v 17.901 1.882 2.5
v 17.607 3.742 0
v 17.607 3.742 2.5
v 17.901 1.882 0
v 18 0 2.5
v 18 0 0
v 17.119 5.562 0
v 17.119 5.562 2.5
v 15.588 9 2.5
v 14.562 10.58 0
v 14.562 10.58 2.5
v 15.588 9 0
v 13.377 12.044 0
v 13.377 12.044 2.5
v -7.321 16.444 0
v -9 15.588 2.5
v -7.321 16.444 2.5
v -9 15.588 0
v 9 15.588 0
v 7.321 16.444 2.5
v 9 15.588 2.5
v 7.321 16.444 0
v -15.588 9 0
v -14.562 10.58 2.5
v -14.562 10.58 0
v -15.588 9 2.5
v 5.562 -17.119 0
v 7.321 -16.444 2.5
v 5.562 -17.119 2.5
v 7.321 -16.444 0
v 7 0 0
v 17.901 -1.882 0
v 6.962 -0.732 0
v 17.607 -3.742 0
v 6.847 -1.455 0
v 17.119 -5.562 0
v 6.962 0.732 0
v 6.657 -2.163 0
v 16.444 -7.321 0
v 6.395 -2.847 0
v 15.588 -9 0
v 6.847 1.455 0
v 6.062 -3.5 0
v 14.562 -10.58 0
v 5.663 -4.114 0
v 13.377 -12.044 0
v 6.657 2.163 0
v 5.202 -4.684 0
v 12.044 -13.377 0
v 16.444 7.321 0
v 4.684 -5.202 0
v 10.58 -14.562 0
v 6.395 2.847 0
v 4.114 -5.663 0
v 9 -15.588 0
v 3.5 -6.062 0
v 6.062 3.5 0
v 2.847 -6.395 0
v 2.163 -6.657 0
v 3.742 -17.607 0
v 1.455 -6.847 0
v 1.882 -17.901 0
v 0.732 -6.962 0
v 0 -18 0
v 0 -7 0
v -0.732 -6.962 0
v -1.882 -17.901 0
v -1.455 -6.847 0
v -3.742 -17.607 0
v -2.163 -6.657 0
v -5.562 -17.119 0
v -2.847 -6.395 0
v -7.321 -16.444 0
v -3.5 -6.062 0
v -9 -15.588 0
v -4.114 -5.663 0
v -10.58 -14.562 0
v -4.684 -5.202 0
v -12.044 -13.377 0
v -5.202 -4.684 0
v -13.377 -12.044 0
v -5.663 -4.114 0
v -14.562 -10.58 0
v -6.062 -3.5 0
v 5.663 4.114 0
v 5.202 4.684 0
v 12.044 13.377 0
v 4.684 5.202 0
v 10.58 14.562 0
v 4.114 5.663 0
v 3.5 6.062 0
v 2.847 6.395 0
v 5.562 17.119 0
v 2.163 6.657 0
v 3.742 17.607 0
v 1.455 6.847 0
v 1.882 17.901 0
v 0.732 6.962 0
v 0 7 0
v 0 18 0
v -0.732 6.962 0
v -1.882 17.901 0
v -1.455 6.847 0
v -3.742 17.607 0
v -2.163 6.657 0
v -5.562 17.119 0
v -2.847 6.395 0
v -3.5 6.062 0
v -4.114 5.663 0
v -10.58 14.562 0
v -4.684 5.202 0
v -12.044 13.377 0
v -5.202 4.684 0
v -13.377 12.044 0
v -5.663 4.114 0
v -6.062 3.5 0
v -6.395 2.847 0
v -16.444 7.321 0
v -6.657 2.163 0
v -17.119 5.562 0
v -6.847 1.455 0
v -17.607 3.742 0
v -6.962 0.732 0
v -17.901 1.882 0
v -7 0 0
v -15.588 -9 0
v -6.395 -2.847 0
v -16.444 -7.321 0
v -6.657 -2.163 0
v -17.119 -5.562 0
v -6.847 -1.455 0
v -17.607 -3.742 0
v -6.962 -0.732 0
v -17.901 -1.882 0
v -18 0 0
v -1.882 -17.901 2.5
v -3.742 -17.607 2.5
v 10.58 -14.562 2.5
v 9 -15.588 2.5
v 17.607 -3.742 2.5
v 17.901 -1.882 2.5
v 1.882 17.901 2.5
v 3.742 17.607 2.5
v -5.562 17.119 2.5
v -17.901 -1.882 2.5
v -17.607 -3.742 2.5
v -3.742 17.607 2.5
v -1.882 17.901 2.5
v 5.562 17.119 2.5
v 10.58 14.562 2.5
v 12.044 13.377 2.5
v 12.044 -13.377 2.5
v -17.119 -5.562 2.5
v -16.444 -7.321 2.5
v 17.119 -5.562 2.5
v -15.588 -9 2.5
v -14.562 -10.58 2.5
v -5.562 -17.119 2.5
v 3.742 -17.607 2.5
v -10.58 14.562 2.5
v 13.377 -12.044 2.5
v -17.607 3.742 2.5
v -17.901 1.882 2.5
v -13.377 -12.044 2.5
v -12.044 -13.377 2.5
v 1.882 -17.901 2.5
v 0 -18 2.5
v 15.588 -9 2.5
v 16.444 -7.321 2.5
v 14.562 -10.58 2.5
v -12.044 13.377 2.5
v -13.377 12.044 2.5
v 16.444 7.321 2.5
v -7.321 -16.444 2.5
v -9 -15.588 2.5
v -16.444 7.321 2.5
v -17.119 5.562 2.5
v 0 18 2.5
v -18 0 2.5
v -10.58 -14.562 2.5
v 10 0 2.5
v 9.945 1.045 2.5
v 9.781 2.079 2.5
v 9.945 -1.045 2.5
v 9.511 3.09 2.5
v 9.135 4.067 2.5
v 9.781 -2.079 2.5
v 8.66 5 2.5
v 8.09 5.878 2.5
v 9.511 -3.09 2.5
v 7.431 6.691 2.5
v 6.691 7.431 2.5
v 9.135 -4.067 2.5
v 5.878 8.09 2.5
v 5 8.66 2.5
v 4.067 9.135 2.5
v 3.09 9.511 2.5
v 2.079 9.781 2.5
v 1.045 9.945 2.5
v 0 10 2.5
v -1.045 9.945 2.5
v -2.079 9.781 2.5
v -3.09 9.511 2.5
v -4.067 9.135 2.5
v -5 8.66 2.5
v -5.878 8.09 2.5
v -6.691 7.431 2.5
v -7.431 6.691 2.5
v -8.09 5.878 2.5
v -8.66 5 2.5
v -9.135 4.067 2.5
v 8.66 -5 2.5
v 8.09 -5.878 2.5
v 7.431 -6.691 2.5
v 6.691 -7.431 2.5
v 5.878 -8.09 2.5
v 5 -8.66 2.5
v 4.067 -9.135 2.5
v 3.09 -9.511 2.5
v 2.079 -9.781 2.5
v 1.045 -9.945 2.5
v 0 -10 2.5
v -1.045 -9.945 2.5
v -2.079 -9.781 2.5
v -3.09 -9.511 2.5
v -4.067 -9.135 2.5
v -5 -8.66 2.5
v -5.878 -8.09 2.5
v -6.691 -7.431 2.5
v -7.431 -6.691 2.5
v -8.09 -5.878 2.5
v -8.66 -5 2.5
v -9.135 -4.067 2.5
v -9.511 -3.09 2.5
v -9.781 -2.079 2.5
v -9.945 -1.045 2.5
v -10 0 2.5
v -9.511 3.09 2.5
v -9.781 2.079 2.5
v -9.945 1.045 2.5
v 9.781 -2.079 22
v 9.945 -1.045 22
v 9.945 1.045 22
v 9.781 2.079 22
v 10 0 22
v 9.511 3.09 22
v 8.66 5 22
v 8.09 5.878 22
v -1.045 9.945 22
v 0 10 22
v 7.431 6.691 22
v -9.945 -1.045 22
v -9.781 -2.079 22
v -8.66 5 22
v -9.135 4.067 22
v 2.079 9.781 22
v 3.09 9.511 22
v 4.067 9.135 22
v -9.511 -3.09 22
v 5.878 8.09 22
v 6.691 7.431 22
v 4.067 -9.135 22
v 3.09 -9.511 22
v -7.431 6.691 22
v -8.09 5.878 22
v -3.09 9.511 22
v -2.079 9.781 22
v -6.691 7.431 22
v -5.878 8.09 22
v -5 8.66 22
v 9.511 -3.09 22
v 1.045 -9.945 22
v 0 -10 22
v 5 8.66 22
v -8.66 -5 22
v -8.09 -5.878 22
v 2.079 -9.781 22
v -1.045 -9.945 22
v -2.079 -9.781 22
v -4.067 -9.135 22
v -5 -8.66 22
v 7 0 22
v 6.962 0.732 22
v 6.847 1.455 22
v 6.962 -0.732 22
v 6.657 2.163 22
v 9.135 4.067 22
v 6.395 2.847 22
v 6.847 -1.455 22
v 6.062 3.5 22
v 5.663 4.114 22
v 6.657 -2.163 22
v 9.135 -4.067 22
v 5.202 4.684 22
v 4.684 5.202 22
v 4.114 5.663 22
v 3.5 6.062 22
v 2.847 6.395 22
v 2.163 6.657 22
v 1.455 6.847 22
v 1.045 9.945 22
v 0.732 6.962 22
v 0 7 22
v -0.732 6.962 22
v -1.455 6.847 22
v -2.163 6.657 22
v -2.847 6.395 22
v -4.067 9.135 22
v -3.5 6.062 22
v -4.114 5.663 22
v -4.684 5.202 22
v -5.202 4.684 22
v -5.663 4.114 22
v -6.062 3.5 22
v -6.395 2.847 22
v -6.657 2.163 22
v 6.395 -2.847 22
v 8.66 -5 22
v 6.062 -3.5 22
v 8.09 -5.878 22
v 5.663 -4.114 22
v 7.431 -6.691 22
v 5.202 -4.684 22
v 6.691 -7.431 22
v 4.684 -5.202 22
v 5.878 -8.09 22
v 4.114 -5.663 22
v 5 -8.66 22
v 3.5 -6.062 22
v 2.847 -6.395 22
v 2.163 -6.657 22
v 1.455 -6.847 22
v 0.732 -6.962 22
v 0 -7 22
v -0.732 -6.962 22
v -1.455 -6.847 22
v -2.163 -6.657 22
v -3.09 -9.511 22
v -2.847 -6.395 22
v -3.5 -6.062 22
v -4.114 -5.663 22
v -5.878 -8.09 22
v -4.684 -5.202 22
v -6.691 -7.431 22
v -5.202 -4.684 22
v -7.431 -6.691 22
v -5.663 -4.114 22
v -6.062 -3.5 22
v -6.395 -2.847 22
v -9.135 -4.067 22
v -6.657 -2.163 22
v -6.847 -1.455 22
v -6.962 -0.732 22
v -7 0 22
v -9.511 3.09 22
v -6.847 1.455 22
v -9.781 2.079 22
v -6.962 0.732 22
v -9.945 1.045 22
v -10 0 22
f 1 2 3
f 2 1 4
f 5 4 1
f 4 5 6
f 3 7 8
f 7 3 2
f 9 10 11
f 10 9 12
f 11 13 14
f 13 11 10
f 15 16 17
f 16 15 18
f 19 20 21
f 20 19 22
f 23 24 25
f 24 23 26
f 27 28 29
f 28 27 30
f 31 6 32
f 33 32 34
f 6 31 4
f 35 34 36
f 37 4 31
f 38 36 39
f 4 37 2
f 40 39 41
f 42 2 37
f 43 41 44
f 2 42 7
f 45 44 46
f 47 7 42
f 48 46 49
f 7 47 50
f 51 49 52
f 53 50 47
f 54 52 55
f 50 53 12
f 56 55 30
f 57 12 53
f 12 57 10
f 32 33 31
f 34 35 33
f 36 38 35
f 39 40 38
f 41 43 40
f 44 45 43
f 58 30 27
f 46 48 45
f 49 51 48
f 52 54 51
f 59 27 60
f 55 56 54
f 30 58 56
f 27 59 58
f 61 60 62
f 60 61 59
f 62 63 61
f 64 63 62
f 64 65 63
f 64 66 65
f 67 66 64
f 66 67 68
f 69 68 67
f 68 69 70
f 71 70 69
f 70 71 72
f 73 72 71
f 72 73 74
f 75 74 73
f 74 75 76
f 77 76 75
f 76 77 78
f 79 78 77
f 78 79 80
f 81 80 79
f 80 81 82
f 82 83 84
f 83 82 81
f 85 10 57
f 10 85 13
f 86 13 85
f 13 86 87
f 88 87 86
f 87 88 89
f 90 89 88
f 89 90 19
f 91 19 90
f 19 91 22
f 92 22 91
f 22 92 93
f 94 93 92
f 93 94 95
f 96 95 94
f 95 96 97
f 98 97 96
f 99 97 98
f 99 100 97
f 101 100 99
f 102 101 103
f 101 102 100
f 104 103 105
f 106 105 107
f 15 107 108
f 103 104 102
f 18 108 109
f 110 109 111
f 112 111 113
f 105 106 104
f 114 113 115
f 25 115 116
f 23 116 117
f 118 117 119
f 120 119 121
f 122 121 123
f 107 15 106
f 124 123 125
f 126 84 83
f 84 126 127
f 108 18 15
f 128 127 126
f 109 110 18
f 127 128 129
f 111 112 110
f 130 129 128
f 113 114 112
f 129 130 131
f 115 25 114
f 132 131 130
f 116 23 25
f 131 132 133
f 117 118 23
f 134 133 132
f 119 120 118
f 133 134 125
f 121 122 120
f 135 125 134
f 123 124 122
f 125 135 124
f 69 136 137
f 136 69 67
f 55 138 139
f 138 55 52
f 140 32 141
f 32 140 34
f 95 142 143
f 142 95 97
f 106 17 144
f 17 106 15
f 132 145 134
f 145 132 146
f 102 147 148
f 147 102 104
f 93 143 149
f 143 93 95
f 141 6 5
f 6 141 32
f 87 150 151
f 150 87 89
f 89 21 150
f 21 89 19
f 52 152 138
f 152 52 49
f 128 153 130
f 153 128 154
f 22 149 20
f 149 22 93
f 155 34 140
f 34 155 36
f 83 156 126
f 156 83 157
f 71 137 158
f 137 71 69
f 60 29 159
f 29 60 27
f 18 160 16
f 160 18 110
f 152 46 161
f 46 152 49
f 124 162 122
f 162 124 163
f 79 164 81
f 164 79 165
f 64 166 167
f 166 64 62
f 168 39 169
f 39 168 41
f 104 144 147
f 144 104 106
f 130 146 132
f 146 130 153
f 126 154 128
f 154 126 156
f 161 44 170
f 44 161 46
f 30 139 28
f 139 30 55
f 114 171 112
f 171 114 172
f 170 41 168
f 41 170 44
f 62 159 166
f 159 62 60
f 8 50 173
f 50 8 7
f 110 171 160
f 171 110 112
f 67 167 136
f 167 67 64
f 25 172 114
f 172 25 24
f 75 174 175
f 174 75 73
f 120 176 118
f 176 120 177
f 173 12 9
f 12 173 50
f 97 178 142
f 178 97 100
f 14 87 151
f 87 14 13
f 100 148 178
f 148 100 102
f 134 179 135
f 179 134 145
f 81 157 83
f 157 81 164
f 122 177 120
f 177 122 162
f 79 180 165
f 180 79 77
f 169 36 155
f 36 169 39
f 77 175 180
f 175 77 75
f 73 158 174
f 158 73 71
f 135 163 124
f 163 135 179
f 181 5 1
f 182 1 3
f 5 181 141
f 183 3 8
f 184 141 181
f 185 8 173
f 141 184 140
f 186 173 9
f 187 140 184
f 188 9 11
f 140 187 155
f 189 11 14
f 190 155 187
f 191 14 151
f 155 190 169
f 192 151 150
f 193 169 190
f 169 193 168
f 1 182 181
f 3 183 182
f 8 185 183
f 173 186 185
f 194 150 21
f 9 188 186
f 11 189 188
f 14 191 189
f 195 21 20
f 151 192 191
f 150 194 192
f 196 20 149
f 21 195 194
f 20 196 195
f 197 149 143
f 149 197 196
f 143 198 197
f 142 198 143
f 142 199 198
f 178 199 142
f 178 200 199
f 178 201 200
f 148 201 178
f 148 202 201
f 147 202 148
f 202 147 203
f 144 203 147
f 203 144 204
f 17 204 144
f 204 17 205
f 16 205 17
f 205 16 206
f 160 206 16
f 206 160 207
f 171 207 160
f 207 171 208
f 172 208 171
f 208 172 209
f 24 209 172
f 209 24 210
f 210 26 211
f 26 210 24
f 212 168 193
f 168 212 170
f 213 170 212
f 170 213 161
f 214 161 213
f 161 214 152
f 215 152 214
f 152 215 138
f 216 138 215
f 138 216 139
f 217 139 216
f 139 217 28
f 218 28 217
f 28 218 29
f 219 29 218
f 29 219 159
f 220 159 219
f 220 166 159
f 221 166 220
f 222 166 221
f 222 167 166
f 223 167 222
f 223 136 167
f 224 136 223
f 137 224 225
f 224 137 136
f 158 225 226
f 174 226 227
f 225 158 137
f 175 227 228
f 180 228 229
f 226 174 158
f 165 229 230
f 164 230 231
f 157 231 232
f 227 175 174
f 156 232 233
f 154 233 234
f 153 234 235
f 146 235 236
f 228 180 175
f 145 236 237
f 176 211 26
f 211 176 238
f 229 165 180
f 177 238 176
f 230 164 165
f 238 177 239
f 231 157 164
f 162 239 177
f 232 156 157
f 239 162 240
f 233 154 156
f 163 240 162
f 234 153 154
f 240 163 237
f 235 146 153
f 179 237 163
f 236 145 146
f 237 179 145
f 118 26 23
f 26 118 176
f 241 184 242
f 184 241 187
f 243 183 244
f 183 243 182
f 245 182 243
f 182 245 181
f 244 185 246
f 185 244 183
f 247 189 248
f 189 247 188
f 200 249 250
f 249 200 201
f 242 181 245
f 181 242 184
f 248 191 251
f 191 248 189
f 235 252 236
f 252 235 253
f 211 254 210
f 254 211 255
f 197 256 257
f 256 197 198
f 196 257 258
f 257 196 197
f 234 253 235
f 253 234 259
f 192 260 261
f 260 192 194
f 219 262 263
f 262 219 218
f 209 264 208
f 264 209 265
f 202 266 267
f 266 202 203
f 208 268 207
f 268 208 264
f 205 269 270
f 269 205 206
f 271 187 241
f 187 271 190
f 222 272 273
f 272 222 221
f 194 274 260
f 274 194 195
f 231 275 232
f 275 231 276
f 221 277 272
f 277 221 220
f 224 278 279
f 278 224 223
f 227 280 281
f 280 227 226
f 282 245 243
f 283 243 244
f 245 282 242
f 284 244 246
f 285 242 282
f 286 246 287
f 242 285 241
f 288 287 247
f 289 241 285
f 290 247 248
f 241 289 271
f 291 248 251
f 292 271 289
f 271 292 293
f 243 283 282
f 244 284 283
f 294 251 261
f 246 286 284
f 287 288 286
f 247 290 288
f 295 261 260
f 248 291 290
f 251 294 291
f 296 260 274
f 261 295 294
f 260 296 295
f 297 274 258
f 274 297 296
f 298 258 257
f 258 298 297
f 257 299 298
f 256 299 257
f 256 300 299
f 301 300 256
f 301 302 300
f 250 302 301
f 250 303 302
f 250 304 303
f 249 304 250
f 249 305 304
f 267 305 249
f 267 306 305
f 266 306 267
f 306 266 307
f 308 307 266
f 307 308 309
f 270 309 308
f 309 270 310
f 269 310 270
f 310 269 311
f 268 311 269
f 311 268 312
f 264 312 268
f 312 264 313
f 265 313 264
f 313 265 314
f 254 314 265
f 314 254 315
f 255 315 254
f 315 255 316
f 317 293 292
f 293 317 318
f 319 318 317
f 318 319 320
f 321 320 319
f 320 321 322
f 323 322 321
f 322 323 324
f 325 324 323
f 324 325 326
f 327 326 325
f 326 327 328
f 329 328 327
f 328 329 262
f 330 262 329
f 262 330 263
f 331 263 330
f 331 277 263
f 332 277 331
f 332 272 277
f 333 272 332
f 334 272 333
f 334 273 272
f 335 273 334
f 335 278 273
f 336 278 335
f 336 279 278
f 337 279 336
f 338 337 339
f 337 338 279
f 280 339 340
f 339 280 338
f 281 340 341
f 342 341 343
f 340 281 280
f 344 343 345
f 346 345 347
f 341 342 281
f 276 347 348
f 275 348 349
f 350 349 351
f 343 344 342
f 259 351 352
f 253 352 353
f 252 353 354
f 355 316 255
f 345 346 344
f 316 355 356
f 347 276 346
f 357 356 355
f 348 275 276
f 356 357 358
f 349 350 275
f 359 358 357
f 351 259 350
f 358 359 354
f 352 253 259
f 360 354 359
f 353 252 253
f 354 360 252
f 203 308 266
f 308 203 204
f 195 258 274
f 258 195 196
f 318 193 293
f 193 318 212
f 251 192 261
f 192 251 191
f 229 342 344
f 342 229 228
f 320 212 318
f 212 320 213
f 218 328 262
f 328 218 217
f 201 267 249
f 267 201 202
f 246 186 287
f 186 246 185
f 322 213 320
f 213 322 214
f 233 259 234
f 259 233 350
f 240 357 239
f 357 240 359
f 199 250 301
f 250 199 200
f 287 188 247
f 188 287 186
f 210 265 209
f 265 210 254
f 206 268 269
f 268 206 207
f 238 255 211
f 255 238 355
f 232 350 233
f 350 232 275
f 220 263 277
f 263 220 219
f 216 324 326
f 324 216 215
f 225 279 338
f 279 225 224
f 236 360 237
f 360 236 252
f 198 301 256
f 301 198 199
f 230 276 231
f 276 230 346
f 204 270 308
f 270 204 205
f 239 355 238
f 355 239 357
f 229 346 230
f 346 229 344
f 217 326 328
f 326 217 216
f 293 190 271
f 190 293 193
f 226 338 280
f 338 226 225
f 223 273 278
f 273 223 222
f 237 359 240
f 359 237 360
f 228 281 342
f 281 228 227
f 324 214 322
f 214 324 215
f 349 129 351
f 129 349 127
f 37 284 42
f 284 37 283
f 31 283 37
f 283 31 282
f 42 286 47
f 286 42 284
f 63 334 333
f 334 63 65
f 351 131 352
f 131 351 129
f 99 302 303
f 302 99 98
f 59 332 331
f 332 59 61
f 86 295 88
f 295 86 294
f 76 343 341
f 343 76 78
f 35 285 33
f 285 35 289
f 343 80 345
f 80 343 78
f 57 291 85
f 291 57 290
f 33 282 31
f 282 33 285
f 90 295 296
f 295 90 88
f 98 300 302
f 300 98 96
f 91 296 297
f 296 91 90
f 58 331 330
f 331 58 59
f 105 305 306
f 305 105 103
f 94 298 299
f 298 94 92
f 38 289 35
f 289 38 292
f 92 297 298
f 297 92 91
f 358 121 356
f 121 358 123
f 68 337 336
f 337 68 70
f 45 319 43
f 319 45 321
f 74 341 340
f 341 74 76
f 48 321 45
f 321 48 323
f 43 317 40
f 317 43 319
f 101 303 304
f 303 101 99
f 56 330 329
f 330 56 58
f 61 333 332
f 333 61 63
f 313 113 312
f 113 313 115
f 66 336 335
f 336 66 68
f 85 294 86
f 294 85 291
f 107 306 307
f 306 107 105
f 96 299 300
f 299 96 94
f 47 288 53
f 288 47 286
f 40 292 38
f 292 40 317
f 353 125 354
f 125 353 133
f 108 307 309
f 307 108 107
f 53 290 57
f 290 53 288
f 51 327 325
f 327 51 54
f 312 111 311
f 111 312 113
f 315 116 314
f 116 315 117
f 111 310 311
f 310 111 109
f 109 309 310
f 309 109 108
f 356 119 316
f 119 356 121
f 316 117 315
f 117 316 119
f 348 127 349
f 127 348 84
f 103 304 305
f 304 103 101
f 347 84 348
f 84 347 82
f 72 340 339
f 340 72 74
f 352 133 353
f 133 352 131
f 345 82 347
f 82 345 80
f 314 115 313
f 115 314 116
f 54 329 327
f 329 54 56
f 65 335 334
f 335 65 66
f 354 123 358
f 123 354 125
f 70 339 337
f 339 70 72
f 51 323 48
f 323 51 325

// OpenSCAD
// Flanged sleeve bushing.
$fn = 60;
eps = 0.02;
inner_d = 14;
outer_d = 20;
length = 22;
flange_d = 36;
flange_t = 2.5;
difference() {
    union() {
        cylinder(d = flange_d, h = flange_t);
        cylinder(d = outer_d, h = length);
    }
    translate([0, 0, -eps]) cylinder(d = inner_d, h = length + 2 * eps);
}
